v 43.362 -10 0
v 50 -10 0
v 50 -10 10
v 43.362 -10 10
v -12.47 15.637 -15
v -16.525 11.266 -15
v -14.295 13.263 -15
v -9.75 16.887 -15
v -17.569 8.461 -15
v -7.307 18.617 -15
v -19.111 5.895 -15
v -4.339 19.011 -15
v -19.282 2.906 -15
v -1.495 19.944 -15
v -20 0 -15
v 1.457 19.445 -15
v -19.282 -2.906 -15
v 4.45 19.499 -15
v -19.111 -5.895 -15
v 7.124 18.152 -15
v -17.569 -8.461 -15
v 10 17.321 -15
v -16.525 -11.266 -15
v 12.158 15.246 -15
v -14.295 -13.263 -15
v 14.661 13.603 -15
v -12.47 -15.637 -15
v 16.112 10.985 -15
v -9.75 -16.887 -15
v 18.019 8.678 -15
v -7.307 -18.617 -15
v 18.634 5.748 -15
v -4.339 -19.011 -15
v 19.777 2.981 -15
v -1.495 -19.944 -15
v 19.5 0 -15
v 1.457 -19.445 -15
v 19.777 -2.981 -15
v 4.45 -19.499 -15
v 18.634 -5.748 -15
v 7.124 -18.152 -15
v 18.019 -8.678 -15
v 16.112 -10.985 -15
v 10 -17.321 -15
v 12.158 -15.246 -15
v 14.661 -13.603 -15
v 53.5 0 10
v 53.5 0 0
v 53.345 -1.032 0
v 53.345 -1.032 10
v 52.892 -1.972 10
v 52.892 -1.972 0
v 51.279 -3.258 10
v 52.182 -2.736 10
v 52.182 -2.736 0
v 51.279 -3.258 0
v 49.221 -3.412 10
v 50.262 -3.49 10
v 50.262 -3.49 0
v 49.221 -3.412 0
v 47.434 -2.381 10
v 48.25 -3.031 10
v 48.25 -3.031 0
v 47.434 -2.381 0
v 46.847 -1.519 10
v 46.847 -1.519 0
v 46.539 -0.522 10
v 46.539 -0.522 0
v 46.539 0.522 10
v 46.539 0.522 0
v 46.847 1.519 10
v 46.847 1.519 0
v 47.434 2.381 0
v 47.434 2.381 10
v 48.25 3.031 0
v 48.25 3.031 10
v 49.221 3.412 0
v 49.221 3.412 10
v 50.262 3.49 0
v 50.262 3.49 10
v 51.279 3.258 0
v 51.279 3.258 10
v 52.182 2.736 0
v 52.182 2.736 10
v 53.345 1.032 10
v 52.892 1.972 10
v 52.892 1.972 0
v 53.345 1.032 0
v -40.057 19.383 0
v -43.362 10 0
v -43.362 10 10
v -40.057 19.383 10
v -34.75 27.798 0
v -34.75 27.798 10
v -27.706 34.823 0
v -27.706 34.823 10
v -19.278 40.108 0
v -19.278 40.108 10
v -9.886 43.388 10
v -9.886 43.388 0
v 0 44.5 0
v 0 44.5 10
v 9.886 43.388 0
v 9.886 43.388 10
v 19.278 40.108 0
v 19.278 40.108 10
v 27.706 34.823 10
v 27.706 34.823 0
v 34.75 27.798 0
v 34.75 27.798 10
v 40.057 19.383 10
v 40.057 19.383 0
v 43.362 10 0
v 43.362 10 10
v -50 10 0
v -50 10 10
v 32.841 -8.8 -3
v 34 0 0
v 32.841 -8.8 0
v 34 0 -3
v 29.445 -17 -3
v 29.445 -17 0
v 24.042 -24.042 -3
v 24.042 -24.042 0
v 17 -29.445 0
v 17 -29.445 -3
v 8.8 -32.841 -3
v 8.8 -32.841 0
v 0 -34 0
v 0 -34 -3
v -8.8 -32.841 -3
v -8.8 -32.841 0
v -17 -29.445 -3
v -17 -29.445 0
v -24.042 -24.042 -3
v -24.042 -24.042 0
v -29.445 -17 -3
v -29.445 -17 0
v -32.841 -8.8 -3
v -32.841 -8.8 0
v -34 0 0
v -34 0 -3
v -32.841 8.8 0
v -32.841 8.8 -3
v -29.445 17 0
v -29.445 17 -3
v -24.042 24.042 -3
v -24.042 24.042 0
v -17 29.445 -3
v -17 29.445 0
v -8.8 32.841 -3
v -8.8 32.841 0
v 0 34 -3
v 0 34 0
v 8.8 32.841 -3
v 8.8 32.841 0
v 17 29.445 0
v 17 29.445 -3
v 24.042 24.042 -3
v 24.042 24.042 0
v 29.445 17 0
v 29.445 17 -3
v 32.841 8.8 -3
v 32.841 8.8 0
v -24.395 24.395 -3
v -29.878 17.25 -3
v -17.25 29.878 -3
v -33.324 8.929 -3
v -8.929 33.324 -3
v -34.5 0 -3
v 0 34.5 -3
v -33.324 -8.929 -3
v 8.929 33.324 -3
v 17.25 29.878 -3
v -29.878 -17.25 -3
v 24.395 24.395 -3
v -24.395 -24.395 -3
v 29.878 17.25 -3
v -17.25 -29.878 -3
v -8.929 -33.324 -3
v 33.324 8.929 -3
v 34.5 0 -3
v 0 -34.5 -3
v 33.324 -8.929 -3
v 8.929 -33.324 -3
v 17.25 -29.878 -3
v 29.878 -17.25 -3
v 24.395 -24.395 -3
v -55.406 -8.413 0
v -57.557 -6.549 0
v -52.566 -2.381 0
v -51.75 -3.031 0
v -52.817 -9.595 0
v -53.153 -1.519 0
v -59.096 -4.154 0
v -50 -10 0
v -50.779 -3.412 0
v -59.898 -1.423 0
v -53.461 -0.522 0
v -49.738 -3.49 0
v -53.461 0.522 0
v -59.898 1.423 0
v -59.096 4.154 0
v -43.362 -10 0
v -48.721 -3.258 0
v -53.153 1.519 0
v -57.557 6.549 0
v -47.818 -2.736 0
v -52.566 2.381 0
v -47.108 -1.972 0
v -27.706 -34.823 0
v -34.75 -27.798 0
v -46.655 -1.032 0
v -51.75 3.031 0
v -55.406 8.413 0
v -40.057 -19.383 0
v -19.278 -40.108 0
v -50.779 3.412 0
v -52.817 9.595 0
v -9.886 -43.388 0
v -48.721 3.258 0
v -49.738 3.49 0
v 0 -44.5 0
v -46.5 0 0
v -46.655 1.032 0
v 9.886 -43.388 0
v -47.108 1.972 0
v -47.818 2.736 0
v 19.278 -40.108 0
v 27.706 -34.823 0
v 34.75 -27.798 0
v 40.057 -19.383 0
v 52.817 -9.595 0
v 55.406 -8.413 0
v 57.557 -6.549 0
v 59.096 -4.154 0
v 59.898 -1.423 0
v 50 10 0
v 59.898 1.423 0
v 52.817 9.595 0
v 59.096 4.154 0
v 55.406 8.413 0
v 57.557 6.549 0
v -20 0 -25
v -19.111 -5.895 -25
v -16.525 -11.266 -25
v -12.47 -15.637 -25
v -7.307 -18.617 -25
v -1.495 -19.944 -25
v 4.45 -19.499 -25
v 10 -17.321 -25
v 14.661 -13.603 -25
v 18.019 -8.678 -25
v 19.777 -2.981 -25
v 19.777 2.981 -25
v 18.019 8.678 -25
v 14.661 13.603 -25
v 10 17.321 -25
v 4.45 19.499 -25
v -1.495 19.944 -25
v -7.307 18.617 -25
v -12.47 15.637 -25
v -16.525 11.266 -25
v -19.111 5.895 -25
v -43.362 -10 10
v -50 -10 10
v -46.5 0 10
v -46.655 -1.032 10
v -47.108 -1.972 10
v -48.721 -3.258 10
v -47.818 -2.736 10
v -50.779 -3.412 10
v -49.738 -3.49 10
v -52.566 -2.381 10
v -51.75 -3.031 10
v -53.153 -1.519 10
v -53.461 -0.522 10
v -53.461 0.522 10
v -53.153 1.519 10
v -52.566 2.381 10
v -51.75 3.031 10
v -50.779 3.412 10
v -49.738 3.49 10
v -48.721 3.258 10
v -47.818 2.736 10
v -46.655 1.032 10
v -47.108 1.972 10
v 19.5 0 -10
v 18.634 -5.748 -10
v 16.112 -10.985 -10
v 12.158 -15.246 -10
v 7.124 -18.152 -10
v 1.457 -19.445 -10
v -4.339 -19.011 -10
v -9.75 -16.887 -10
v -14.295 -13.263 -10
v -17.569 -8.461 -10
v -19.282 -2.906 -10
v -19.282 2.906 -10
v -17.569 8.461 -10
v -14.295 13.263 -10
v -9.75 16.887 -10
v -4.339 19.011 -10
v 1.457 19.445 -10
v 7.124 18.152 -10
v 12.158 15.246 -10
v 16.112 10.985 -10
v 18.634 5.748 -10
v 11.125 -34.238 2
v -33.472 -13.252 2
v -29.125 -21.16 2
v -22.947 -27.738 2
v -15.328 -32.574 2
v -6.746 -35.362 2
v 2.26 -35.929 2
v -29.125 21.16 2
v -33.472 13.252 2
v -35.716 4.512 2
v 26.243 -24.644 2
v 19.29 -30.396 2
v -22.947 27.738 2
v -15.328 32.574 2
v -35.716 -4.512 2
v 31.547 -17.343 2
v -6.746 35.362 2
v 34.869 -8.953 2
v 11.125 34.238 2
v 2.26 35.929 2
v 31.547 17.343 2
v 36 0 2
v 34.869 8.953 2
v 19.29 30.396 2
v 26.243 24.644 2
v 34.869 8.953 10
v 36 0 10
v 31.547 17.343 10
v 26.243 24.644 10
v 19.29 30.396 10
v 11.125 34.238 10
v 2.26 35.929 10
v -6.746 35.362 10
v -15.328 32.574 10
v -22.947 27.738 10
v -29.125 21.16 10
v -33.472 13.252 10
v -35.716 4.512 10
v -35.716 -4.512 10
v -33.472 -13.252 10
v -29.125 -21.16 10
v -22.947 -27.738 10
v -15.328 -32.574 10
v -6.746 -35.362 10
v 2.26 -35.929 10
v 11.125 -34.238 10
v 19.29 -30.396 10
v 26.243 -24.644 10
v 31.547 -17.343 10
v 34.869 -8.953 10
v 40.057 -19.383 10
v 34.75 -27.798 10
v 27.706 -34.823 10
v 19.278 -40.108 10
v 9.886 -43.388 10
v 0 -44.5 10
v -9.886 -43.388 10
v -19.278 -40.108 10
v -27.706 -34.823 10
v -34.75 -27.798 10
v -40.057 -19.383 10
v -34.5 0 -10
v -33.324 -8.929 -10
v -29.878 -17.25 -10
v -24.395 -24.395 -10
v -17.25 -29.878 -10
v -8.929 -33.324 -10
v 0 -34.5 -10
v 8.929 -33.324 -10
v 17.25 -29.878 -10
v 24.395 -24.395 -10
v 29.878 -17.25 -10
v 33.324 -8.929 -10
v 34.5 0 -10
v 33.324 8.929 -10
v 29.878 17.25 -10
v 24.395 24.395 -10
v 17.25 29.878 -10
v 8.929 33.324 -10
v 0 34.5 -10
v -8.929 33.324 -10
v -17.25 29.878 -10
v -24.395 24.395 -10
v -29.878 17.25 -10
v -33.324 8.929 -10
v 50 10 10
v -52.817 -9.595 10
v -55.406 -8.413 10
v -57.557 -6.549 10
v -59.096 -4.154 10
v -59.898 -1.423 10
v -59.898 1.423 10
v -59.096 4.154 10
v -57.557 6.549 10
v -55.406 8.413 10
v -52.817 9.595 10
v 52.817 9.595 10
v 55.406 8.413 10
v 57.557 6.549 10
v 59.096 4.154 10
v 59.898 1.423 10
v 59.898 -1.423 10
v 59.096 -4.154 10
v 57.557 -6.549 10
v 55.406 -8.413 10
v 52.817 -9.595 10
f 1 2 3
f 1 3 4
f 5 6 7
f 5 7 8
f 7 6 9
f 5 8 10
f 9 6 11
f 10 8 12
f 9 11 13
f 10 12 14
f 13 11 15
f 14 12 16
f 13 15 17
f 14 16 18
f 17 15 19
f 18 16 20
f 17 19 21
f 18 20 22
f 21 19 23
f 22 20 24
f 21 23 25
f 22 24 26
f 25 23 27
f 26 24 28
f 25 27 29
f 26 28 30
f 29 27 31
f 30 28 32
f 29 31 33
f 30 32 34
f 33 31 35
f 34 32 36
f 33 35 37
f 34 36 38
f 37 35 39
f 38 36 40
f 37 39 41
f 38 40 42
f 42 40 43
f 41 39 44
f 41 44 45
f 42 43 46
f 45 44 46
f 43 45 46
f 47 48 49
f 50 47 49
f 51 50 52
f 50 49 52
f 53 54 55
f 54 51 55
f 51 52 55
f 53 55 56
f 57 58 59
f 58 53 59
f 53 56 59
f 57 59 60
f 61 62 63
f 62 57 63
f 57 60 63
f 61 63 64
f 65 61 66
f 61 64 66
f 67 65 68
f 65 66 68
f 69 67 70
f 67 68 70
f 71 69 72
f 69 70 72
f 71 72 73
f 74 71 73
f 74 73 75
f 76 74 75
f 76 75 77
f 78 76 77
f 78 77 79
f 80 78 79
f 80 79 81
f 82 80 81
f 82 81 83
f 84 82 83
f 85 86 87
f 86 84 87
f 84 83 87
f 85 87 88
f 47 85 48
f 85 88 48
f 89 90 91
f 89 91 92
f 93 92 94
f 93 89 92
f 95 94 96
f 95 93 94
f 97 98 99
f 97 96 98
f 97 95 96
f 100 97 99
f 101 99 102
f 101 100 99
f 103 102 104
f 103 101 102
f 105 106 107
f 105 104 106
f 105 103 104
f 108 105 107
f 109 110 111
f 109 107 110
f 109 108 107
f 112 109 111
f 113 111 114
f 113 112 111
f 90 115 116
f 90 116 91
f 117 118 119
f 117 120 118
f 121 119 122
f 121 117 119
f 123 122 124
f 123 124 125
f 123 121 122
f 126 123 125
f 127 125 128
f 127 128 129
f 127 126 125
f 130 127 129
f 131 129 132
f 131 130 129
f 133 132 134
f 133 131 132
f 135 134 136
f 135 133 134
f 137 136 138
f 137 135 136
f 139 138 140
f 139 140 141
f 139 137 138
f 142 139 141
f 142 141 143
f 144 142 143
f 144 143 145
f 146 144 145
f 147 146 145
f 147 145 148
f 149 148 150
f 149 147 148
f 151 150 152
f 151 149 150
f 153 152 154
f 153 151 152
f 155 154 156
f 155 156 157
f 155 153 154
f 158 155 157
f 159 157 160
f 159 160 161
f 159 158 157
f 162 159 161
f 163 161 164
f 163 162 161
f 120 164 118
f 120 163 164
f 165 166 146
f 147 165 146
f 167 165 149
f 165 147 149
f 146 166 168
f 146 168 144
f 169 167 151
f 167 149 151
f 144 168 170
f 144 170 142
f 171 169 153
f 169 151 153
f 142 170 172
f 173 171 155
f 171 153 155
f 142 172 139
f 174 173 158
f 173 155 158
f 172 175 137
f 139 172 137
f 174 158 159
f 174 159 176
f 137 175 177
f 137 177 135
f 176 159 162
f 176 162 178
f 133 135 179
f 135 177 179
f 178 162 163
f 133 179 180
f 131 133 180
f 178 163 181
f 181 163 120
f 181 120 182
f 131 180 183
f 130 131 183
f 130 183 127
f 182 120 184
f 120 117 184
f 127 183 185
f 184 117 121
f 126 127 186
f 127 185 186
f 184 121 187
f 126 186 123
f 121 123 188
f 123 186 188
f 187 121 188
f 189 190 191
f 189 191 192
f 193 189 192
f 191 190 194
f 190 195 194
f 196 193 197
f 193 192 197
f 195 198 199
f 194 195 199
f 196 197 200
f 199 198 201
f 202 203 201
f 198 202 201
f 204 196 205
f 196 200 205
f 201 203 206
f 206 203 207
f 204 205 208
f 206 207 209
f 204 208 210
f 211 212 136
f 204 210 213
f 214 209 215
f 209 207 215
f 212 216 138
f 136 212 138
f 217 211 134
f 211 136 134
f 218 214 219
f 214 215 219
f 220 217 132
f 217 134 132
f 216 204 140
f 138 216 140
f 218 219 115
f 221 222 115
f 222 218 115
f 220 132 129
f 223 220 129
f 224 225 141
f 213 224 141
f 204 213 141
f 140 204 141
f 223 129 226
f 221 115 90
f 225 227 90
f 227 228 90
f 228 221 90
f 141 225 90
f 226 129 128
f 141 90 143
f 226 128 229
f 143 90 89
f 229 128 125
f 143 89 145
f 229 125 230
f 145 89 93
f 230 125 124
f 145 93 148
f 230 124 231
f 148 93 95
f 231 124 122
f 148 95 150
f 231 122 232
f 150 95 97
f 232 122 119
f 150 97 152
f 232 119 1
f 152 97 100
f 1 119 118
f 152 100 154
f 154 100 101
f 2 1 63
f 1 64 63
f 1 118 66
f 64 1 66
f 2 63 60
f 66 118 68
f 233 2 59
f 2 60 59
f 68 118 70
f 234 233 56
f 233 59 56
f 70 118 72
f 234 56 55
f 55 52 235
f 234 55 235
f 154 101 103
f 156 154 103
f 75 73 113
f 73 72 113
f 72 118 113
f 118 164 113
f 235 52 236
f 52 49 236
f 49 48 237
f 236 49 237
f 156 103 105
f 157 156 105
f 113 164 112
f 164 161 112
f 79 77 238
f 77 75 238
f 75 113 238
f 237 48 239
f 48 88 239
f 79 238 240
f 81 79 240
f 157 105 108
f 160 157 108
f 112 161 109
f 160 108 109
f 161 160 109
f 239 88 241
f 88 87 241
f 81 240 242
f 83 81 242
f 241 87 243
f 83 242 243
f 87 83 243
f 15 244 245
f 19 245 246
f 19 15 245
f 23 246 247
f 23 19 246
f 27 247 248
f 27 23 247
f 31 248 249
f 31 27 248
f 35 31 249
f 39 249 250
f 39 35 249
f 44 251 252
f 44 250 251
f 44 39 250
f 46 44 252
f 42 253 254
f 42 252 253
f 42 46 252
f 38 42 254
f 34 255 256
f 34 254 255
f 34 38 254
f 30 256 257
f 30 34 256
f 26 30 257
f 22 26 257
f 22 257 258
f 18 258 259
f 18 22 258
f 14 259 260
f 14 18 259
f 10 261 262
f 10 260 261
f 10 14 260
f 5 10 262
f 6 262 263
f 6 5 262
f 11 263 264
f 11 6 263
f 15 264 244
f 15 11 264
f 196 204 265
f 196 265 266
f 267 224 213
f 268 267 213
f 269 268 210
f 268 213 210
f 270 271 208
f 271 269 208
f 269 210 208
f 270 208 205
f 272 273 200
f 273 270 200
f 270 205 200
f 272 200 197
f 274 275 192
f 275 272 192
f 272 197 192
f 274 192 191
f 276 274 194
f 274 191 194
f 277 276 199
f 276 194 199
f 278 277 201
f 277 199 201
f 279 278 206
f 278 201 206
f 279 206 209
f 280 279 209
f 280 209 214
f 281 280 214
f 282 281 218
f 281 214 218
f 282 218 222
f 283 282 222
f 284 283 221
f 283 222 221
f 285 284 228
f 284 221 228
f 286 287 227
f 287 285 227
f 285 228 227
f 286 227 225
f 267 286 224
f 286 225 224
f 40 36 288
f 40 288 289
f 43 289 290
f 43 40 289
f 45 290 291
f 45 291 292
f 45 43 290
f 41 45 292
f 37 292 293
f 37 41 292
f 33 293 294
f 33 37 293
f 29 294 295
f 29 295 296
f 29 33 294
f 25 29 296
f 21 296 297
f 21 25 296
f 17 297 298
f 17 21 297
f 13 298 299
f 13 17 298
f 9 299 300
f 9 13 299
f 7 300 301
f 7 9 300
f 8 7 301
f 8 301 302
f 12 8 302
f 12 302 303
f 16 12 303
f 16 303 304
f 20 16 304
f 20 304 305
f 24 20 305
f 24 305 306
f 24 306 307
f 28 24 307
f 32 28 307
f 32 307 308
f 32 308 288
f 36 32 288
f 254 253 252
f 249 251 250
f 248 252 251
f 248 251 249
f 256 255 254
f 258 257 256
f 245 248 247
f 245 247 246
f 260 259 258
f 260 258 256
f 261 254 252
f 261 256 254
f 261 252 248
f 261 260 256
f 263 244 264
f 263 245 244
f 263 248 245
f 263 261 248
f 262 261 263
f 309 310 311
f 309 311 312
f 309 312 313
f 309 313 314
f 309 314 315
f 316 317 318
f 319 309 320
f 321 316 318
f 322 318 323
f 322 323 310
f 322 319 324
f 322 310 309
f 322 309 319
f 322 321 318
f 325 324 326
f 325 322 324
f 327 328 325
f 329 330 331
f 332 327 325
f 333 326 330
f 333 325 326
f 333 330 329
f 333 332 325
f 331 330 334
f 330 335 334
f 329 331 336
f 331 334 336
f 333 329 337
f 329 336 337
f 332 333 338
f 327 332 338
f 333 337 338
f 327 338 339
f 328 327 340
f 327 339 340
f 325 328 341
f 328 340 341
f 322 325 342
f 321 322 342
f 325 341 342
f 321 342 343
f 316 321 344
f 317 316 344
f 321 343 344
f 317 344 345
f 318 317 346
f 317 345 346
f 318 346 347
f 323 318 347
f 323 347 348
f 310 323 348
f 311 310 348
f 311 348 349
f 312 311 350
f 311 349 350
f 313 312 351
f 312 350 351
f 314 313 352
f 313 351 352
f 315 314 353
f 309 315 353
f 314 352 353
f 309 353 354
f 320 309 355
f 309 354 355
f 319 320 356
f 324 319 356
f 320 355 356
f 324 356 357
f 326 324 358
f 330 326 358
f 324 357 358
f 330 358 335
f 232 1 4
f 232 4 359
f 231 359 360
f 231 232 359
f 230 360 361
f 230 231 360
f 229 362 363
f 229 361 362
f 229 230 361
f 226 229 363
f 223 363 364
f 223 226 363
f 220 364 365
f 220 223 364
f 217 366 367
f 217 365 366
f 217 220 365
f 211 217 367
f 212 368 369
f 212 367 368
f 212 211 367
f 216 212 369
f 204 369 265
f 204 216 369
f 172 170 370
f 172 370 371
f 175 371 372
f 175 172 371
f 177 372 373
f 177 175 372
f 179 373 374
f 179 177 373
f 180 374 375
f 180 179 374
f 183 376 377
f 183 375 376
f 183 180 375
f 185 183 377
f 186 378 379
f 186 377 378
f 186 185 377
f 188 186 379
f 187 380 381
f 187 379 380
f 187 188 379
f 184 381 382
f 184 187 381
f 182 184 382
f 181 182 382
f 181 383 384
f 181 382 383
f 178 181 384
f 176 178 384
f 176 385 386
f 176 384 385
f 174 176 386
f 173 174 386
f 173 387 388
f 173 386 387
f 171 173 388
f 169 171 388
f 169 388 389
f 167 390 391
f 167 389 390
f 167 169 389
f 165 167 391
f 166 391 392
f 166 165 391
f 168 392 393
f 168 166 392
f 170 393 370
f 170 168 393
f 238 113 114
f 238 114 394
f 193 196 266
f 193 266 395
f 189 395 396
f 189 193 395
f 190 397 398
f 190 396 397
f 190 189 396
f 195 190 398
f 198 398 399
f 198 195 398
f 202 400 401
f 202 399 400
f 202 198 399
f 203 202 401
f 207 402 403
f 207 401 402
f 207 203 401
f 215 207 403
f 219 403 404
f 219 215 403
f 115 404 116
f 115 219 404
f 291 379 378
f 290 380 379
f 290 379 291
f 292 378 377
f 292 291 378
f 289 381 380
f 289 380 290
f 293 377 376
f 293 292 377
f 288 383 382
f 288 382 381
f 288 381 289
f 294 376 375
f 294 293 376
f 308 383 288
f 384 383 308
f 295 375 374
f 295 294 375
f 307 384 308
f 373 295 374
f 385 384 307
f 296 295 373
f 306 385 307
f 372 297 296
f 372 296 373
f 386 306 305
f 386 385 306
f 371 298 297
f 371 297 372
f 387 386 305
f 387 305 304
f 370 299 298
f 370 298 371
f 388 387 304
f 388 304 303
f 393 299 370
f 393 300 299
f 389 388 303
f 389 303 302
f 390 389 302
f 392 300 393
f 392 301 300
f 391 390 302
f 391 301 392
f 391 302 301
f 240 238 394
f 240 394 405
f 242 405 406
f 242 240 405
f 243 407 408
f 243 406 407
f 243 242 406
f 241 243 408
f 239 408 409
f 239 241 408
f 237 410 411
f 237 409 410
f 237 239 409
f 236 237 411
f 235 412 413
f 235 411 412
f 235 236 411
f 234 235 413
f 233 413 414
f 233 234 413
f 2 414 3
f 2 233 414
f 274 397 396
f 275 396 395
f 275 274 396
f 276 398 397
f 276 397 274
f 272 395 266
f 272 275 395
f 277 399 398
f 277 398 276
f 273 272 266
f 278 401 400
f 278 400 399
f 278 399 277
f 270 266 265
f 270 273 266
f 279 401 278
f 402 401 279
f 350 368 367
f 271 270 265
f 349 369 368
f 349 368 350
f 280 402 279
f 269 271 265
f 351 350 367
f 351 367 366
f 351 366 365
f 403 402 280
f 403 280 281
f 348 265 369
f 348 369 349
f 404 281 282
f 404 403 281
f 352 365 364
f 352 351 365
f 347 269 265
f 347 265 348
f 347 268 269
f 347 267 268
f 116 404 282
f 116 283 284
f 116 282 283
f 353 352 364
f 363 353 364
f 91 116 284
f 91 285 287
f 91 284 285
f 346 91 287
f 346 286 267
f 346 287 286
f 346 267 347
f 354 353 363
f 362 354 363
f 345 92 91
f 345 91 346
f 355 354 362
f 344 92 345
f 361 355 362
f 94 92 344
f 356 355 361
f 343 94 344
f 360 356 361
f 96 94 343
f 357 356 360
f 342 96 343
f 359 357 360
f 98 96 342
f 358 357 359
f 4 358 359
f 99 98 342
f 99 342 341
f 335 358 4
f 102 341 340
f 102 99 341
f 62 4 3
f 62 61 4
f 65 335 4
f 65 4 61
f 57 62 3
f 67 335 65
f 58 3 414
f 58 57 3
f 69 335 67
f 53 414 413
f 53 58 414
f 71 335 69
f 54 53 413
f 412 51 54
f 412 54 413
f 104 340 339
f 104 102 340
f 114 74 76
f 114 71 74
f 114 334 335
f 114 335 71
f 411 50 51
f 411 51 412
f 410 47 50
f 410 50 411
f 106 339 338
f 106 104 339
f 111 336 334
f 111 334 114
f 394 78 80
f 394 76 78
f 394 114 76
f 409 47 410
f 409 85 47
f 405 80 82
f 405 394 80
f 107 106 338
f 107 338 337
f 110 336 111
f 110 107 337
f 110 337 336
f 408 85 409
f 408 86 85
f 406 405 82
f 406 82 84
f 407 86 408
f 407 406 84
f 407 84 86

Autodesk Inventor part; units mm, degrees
ref_plane "YZ Plane" through (0, 0, 0) normal (1, 0, 0) x (0, 1, 0)
ref_plane "XZ Plane" through (0, 0, 0) normal (0, 1, 0) x (-1, 0, 0)
ref_plane "XY Plane" through (0, 0, 0) normal (0, 0, 1) x (1, 0, 0)
sketch "Sketch1" plane through (0, 0, 0) normal (0, 0, 1) x (1, 0, 0)
  arc A0 (50, -10) -> (50, 10) centre (50, 0) ccw
  arc A1 (-50, 10) -> (-50, -10) centre (-50, 0) ccw
  arc A2 (-43.3618, -10) -> (43.3618, -10) centre (0, 0) ccw
  arc A3 (43.3618, 10) -> (-43.3618, 10) centre (0, 0) ccw
  circle A4 centre (-50, 0) radius 3.5
  circle A5 centre (50, 0) radius 3.5
  line L0 (50, -10) -> (43.3618, -10)
  line L1 (-43.3618, -10) -> (-50, -10)
  line L2 (-50, 10) -> (-43.3618, 10)
  line L3 (43.3618, 10) -> (50, 10)
  dimension "d1" = 20
  dimension "d2" = 20
  dimension "d4" = 50
  dimension "d5" = 50
  dimension "d6" = 7
  dimension "d7" = 7
extrude "Extrusion1" add sketch "Sketch1" along normal blind 10
sketch "Sketch2" plane through (0, 0, 10) normal (0, 0, 1) x (1, 0, 0)
  circle A0 centre (0, 0) radius 36
  dimension "d10" = 72
extrude "Extrusion2" cut sketch "Sketch2" against normal blind 8
sketch "Sketch3" plane through (0, 0, 0) normal (0, 0, -1) x (-1, 0, 0)
  circle A0 centre (0, 0) radius 34.5
  dimension "d13" = 69
extrude "Extrusion3" add sketch "Sketch3" along normal blind 10
sketch "Sketch4" plane through (0, 0, -10) normal (0, 0, -1) x (-1, 0, 0)
  circle A0 centre (0, 0) radius 20
  dimension "d16" = 40
extrude "Extrusion4" add sketch "Sketch4" along normal blind 15
sketch "Sketch6" plane through (0, 0, 0) normal (0, 1, 0) x (-1, 0, 0)
  line L0 (-34.5, 0) -> (-34.5, -10) projected
  line L1 (-34.5, 0) -> (-34, 0)
  line L2 (-34, 0) -> (-34, -3)
  line L3 (-34, -3) -> (-34.5, -3)
  line L4 (-34.5, -3) -> (-34.5, 0)
  line L5 (-34.5, -10) -> (34.5, -10) projected
  line L6 (-20, -10) -> (-20, -25) projected
  line L7 (-20, -10) -> (-19.5, -10)
  line L8 (-19.5, -10) -> (-19.5, -15)
  line L9 (-19.5, -15) -> (-20, -15)
  line L10 (-20, -15) -> (-20, -10)
  line L11 (0, 12.5498) -> (0, -27.5159) construction
  point P0 (0, 0)
  dimension "d19" = 0.5
  dimension "d20" = 3
  dimension "d21" = 7
  dimension "d22" = 0.5
  dimension "d23" = 5
revolve "Revolution1" cut sketch "Sketch6" angle 360 about axis through (0, 0, 12.5498) along (0, 0, -1)
properties part number "Prato do Amassador"
